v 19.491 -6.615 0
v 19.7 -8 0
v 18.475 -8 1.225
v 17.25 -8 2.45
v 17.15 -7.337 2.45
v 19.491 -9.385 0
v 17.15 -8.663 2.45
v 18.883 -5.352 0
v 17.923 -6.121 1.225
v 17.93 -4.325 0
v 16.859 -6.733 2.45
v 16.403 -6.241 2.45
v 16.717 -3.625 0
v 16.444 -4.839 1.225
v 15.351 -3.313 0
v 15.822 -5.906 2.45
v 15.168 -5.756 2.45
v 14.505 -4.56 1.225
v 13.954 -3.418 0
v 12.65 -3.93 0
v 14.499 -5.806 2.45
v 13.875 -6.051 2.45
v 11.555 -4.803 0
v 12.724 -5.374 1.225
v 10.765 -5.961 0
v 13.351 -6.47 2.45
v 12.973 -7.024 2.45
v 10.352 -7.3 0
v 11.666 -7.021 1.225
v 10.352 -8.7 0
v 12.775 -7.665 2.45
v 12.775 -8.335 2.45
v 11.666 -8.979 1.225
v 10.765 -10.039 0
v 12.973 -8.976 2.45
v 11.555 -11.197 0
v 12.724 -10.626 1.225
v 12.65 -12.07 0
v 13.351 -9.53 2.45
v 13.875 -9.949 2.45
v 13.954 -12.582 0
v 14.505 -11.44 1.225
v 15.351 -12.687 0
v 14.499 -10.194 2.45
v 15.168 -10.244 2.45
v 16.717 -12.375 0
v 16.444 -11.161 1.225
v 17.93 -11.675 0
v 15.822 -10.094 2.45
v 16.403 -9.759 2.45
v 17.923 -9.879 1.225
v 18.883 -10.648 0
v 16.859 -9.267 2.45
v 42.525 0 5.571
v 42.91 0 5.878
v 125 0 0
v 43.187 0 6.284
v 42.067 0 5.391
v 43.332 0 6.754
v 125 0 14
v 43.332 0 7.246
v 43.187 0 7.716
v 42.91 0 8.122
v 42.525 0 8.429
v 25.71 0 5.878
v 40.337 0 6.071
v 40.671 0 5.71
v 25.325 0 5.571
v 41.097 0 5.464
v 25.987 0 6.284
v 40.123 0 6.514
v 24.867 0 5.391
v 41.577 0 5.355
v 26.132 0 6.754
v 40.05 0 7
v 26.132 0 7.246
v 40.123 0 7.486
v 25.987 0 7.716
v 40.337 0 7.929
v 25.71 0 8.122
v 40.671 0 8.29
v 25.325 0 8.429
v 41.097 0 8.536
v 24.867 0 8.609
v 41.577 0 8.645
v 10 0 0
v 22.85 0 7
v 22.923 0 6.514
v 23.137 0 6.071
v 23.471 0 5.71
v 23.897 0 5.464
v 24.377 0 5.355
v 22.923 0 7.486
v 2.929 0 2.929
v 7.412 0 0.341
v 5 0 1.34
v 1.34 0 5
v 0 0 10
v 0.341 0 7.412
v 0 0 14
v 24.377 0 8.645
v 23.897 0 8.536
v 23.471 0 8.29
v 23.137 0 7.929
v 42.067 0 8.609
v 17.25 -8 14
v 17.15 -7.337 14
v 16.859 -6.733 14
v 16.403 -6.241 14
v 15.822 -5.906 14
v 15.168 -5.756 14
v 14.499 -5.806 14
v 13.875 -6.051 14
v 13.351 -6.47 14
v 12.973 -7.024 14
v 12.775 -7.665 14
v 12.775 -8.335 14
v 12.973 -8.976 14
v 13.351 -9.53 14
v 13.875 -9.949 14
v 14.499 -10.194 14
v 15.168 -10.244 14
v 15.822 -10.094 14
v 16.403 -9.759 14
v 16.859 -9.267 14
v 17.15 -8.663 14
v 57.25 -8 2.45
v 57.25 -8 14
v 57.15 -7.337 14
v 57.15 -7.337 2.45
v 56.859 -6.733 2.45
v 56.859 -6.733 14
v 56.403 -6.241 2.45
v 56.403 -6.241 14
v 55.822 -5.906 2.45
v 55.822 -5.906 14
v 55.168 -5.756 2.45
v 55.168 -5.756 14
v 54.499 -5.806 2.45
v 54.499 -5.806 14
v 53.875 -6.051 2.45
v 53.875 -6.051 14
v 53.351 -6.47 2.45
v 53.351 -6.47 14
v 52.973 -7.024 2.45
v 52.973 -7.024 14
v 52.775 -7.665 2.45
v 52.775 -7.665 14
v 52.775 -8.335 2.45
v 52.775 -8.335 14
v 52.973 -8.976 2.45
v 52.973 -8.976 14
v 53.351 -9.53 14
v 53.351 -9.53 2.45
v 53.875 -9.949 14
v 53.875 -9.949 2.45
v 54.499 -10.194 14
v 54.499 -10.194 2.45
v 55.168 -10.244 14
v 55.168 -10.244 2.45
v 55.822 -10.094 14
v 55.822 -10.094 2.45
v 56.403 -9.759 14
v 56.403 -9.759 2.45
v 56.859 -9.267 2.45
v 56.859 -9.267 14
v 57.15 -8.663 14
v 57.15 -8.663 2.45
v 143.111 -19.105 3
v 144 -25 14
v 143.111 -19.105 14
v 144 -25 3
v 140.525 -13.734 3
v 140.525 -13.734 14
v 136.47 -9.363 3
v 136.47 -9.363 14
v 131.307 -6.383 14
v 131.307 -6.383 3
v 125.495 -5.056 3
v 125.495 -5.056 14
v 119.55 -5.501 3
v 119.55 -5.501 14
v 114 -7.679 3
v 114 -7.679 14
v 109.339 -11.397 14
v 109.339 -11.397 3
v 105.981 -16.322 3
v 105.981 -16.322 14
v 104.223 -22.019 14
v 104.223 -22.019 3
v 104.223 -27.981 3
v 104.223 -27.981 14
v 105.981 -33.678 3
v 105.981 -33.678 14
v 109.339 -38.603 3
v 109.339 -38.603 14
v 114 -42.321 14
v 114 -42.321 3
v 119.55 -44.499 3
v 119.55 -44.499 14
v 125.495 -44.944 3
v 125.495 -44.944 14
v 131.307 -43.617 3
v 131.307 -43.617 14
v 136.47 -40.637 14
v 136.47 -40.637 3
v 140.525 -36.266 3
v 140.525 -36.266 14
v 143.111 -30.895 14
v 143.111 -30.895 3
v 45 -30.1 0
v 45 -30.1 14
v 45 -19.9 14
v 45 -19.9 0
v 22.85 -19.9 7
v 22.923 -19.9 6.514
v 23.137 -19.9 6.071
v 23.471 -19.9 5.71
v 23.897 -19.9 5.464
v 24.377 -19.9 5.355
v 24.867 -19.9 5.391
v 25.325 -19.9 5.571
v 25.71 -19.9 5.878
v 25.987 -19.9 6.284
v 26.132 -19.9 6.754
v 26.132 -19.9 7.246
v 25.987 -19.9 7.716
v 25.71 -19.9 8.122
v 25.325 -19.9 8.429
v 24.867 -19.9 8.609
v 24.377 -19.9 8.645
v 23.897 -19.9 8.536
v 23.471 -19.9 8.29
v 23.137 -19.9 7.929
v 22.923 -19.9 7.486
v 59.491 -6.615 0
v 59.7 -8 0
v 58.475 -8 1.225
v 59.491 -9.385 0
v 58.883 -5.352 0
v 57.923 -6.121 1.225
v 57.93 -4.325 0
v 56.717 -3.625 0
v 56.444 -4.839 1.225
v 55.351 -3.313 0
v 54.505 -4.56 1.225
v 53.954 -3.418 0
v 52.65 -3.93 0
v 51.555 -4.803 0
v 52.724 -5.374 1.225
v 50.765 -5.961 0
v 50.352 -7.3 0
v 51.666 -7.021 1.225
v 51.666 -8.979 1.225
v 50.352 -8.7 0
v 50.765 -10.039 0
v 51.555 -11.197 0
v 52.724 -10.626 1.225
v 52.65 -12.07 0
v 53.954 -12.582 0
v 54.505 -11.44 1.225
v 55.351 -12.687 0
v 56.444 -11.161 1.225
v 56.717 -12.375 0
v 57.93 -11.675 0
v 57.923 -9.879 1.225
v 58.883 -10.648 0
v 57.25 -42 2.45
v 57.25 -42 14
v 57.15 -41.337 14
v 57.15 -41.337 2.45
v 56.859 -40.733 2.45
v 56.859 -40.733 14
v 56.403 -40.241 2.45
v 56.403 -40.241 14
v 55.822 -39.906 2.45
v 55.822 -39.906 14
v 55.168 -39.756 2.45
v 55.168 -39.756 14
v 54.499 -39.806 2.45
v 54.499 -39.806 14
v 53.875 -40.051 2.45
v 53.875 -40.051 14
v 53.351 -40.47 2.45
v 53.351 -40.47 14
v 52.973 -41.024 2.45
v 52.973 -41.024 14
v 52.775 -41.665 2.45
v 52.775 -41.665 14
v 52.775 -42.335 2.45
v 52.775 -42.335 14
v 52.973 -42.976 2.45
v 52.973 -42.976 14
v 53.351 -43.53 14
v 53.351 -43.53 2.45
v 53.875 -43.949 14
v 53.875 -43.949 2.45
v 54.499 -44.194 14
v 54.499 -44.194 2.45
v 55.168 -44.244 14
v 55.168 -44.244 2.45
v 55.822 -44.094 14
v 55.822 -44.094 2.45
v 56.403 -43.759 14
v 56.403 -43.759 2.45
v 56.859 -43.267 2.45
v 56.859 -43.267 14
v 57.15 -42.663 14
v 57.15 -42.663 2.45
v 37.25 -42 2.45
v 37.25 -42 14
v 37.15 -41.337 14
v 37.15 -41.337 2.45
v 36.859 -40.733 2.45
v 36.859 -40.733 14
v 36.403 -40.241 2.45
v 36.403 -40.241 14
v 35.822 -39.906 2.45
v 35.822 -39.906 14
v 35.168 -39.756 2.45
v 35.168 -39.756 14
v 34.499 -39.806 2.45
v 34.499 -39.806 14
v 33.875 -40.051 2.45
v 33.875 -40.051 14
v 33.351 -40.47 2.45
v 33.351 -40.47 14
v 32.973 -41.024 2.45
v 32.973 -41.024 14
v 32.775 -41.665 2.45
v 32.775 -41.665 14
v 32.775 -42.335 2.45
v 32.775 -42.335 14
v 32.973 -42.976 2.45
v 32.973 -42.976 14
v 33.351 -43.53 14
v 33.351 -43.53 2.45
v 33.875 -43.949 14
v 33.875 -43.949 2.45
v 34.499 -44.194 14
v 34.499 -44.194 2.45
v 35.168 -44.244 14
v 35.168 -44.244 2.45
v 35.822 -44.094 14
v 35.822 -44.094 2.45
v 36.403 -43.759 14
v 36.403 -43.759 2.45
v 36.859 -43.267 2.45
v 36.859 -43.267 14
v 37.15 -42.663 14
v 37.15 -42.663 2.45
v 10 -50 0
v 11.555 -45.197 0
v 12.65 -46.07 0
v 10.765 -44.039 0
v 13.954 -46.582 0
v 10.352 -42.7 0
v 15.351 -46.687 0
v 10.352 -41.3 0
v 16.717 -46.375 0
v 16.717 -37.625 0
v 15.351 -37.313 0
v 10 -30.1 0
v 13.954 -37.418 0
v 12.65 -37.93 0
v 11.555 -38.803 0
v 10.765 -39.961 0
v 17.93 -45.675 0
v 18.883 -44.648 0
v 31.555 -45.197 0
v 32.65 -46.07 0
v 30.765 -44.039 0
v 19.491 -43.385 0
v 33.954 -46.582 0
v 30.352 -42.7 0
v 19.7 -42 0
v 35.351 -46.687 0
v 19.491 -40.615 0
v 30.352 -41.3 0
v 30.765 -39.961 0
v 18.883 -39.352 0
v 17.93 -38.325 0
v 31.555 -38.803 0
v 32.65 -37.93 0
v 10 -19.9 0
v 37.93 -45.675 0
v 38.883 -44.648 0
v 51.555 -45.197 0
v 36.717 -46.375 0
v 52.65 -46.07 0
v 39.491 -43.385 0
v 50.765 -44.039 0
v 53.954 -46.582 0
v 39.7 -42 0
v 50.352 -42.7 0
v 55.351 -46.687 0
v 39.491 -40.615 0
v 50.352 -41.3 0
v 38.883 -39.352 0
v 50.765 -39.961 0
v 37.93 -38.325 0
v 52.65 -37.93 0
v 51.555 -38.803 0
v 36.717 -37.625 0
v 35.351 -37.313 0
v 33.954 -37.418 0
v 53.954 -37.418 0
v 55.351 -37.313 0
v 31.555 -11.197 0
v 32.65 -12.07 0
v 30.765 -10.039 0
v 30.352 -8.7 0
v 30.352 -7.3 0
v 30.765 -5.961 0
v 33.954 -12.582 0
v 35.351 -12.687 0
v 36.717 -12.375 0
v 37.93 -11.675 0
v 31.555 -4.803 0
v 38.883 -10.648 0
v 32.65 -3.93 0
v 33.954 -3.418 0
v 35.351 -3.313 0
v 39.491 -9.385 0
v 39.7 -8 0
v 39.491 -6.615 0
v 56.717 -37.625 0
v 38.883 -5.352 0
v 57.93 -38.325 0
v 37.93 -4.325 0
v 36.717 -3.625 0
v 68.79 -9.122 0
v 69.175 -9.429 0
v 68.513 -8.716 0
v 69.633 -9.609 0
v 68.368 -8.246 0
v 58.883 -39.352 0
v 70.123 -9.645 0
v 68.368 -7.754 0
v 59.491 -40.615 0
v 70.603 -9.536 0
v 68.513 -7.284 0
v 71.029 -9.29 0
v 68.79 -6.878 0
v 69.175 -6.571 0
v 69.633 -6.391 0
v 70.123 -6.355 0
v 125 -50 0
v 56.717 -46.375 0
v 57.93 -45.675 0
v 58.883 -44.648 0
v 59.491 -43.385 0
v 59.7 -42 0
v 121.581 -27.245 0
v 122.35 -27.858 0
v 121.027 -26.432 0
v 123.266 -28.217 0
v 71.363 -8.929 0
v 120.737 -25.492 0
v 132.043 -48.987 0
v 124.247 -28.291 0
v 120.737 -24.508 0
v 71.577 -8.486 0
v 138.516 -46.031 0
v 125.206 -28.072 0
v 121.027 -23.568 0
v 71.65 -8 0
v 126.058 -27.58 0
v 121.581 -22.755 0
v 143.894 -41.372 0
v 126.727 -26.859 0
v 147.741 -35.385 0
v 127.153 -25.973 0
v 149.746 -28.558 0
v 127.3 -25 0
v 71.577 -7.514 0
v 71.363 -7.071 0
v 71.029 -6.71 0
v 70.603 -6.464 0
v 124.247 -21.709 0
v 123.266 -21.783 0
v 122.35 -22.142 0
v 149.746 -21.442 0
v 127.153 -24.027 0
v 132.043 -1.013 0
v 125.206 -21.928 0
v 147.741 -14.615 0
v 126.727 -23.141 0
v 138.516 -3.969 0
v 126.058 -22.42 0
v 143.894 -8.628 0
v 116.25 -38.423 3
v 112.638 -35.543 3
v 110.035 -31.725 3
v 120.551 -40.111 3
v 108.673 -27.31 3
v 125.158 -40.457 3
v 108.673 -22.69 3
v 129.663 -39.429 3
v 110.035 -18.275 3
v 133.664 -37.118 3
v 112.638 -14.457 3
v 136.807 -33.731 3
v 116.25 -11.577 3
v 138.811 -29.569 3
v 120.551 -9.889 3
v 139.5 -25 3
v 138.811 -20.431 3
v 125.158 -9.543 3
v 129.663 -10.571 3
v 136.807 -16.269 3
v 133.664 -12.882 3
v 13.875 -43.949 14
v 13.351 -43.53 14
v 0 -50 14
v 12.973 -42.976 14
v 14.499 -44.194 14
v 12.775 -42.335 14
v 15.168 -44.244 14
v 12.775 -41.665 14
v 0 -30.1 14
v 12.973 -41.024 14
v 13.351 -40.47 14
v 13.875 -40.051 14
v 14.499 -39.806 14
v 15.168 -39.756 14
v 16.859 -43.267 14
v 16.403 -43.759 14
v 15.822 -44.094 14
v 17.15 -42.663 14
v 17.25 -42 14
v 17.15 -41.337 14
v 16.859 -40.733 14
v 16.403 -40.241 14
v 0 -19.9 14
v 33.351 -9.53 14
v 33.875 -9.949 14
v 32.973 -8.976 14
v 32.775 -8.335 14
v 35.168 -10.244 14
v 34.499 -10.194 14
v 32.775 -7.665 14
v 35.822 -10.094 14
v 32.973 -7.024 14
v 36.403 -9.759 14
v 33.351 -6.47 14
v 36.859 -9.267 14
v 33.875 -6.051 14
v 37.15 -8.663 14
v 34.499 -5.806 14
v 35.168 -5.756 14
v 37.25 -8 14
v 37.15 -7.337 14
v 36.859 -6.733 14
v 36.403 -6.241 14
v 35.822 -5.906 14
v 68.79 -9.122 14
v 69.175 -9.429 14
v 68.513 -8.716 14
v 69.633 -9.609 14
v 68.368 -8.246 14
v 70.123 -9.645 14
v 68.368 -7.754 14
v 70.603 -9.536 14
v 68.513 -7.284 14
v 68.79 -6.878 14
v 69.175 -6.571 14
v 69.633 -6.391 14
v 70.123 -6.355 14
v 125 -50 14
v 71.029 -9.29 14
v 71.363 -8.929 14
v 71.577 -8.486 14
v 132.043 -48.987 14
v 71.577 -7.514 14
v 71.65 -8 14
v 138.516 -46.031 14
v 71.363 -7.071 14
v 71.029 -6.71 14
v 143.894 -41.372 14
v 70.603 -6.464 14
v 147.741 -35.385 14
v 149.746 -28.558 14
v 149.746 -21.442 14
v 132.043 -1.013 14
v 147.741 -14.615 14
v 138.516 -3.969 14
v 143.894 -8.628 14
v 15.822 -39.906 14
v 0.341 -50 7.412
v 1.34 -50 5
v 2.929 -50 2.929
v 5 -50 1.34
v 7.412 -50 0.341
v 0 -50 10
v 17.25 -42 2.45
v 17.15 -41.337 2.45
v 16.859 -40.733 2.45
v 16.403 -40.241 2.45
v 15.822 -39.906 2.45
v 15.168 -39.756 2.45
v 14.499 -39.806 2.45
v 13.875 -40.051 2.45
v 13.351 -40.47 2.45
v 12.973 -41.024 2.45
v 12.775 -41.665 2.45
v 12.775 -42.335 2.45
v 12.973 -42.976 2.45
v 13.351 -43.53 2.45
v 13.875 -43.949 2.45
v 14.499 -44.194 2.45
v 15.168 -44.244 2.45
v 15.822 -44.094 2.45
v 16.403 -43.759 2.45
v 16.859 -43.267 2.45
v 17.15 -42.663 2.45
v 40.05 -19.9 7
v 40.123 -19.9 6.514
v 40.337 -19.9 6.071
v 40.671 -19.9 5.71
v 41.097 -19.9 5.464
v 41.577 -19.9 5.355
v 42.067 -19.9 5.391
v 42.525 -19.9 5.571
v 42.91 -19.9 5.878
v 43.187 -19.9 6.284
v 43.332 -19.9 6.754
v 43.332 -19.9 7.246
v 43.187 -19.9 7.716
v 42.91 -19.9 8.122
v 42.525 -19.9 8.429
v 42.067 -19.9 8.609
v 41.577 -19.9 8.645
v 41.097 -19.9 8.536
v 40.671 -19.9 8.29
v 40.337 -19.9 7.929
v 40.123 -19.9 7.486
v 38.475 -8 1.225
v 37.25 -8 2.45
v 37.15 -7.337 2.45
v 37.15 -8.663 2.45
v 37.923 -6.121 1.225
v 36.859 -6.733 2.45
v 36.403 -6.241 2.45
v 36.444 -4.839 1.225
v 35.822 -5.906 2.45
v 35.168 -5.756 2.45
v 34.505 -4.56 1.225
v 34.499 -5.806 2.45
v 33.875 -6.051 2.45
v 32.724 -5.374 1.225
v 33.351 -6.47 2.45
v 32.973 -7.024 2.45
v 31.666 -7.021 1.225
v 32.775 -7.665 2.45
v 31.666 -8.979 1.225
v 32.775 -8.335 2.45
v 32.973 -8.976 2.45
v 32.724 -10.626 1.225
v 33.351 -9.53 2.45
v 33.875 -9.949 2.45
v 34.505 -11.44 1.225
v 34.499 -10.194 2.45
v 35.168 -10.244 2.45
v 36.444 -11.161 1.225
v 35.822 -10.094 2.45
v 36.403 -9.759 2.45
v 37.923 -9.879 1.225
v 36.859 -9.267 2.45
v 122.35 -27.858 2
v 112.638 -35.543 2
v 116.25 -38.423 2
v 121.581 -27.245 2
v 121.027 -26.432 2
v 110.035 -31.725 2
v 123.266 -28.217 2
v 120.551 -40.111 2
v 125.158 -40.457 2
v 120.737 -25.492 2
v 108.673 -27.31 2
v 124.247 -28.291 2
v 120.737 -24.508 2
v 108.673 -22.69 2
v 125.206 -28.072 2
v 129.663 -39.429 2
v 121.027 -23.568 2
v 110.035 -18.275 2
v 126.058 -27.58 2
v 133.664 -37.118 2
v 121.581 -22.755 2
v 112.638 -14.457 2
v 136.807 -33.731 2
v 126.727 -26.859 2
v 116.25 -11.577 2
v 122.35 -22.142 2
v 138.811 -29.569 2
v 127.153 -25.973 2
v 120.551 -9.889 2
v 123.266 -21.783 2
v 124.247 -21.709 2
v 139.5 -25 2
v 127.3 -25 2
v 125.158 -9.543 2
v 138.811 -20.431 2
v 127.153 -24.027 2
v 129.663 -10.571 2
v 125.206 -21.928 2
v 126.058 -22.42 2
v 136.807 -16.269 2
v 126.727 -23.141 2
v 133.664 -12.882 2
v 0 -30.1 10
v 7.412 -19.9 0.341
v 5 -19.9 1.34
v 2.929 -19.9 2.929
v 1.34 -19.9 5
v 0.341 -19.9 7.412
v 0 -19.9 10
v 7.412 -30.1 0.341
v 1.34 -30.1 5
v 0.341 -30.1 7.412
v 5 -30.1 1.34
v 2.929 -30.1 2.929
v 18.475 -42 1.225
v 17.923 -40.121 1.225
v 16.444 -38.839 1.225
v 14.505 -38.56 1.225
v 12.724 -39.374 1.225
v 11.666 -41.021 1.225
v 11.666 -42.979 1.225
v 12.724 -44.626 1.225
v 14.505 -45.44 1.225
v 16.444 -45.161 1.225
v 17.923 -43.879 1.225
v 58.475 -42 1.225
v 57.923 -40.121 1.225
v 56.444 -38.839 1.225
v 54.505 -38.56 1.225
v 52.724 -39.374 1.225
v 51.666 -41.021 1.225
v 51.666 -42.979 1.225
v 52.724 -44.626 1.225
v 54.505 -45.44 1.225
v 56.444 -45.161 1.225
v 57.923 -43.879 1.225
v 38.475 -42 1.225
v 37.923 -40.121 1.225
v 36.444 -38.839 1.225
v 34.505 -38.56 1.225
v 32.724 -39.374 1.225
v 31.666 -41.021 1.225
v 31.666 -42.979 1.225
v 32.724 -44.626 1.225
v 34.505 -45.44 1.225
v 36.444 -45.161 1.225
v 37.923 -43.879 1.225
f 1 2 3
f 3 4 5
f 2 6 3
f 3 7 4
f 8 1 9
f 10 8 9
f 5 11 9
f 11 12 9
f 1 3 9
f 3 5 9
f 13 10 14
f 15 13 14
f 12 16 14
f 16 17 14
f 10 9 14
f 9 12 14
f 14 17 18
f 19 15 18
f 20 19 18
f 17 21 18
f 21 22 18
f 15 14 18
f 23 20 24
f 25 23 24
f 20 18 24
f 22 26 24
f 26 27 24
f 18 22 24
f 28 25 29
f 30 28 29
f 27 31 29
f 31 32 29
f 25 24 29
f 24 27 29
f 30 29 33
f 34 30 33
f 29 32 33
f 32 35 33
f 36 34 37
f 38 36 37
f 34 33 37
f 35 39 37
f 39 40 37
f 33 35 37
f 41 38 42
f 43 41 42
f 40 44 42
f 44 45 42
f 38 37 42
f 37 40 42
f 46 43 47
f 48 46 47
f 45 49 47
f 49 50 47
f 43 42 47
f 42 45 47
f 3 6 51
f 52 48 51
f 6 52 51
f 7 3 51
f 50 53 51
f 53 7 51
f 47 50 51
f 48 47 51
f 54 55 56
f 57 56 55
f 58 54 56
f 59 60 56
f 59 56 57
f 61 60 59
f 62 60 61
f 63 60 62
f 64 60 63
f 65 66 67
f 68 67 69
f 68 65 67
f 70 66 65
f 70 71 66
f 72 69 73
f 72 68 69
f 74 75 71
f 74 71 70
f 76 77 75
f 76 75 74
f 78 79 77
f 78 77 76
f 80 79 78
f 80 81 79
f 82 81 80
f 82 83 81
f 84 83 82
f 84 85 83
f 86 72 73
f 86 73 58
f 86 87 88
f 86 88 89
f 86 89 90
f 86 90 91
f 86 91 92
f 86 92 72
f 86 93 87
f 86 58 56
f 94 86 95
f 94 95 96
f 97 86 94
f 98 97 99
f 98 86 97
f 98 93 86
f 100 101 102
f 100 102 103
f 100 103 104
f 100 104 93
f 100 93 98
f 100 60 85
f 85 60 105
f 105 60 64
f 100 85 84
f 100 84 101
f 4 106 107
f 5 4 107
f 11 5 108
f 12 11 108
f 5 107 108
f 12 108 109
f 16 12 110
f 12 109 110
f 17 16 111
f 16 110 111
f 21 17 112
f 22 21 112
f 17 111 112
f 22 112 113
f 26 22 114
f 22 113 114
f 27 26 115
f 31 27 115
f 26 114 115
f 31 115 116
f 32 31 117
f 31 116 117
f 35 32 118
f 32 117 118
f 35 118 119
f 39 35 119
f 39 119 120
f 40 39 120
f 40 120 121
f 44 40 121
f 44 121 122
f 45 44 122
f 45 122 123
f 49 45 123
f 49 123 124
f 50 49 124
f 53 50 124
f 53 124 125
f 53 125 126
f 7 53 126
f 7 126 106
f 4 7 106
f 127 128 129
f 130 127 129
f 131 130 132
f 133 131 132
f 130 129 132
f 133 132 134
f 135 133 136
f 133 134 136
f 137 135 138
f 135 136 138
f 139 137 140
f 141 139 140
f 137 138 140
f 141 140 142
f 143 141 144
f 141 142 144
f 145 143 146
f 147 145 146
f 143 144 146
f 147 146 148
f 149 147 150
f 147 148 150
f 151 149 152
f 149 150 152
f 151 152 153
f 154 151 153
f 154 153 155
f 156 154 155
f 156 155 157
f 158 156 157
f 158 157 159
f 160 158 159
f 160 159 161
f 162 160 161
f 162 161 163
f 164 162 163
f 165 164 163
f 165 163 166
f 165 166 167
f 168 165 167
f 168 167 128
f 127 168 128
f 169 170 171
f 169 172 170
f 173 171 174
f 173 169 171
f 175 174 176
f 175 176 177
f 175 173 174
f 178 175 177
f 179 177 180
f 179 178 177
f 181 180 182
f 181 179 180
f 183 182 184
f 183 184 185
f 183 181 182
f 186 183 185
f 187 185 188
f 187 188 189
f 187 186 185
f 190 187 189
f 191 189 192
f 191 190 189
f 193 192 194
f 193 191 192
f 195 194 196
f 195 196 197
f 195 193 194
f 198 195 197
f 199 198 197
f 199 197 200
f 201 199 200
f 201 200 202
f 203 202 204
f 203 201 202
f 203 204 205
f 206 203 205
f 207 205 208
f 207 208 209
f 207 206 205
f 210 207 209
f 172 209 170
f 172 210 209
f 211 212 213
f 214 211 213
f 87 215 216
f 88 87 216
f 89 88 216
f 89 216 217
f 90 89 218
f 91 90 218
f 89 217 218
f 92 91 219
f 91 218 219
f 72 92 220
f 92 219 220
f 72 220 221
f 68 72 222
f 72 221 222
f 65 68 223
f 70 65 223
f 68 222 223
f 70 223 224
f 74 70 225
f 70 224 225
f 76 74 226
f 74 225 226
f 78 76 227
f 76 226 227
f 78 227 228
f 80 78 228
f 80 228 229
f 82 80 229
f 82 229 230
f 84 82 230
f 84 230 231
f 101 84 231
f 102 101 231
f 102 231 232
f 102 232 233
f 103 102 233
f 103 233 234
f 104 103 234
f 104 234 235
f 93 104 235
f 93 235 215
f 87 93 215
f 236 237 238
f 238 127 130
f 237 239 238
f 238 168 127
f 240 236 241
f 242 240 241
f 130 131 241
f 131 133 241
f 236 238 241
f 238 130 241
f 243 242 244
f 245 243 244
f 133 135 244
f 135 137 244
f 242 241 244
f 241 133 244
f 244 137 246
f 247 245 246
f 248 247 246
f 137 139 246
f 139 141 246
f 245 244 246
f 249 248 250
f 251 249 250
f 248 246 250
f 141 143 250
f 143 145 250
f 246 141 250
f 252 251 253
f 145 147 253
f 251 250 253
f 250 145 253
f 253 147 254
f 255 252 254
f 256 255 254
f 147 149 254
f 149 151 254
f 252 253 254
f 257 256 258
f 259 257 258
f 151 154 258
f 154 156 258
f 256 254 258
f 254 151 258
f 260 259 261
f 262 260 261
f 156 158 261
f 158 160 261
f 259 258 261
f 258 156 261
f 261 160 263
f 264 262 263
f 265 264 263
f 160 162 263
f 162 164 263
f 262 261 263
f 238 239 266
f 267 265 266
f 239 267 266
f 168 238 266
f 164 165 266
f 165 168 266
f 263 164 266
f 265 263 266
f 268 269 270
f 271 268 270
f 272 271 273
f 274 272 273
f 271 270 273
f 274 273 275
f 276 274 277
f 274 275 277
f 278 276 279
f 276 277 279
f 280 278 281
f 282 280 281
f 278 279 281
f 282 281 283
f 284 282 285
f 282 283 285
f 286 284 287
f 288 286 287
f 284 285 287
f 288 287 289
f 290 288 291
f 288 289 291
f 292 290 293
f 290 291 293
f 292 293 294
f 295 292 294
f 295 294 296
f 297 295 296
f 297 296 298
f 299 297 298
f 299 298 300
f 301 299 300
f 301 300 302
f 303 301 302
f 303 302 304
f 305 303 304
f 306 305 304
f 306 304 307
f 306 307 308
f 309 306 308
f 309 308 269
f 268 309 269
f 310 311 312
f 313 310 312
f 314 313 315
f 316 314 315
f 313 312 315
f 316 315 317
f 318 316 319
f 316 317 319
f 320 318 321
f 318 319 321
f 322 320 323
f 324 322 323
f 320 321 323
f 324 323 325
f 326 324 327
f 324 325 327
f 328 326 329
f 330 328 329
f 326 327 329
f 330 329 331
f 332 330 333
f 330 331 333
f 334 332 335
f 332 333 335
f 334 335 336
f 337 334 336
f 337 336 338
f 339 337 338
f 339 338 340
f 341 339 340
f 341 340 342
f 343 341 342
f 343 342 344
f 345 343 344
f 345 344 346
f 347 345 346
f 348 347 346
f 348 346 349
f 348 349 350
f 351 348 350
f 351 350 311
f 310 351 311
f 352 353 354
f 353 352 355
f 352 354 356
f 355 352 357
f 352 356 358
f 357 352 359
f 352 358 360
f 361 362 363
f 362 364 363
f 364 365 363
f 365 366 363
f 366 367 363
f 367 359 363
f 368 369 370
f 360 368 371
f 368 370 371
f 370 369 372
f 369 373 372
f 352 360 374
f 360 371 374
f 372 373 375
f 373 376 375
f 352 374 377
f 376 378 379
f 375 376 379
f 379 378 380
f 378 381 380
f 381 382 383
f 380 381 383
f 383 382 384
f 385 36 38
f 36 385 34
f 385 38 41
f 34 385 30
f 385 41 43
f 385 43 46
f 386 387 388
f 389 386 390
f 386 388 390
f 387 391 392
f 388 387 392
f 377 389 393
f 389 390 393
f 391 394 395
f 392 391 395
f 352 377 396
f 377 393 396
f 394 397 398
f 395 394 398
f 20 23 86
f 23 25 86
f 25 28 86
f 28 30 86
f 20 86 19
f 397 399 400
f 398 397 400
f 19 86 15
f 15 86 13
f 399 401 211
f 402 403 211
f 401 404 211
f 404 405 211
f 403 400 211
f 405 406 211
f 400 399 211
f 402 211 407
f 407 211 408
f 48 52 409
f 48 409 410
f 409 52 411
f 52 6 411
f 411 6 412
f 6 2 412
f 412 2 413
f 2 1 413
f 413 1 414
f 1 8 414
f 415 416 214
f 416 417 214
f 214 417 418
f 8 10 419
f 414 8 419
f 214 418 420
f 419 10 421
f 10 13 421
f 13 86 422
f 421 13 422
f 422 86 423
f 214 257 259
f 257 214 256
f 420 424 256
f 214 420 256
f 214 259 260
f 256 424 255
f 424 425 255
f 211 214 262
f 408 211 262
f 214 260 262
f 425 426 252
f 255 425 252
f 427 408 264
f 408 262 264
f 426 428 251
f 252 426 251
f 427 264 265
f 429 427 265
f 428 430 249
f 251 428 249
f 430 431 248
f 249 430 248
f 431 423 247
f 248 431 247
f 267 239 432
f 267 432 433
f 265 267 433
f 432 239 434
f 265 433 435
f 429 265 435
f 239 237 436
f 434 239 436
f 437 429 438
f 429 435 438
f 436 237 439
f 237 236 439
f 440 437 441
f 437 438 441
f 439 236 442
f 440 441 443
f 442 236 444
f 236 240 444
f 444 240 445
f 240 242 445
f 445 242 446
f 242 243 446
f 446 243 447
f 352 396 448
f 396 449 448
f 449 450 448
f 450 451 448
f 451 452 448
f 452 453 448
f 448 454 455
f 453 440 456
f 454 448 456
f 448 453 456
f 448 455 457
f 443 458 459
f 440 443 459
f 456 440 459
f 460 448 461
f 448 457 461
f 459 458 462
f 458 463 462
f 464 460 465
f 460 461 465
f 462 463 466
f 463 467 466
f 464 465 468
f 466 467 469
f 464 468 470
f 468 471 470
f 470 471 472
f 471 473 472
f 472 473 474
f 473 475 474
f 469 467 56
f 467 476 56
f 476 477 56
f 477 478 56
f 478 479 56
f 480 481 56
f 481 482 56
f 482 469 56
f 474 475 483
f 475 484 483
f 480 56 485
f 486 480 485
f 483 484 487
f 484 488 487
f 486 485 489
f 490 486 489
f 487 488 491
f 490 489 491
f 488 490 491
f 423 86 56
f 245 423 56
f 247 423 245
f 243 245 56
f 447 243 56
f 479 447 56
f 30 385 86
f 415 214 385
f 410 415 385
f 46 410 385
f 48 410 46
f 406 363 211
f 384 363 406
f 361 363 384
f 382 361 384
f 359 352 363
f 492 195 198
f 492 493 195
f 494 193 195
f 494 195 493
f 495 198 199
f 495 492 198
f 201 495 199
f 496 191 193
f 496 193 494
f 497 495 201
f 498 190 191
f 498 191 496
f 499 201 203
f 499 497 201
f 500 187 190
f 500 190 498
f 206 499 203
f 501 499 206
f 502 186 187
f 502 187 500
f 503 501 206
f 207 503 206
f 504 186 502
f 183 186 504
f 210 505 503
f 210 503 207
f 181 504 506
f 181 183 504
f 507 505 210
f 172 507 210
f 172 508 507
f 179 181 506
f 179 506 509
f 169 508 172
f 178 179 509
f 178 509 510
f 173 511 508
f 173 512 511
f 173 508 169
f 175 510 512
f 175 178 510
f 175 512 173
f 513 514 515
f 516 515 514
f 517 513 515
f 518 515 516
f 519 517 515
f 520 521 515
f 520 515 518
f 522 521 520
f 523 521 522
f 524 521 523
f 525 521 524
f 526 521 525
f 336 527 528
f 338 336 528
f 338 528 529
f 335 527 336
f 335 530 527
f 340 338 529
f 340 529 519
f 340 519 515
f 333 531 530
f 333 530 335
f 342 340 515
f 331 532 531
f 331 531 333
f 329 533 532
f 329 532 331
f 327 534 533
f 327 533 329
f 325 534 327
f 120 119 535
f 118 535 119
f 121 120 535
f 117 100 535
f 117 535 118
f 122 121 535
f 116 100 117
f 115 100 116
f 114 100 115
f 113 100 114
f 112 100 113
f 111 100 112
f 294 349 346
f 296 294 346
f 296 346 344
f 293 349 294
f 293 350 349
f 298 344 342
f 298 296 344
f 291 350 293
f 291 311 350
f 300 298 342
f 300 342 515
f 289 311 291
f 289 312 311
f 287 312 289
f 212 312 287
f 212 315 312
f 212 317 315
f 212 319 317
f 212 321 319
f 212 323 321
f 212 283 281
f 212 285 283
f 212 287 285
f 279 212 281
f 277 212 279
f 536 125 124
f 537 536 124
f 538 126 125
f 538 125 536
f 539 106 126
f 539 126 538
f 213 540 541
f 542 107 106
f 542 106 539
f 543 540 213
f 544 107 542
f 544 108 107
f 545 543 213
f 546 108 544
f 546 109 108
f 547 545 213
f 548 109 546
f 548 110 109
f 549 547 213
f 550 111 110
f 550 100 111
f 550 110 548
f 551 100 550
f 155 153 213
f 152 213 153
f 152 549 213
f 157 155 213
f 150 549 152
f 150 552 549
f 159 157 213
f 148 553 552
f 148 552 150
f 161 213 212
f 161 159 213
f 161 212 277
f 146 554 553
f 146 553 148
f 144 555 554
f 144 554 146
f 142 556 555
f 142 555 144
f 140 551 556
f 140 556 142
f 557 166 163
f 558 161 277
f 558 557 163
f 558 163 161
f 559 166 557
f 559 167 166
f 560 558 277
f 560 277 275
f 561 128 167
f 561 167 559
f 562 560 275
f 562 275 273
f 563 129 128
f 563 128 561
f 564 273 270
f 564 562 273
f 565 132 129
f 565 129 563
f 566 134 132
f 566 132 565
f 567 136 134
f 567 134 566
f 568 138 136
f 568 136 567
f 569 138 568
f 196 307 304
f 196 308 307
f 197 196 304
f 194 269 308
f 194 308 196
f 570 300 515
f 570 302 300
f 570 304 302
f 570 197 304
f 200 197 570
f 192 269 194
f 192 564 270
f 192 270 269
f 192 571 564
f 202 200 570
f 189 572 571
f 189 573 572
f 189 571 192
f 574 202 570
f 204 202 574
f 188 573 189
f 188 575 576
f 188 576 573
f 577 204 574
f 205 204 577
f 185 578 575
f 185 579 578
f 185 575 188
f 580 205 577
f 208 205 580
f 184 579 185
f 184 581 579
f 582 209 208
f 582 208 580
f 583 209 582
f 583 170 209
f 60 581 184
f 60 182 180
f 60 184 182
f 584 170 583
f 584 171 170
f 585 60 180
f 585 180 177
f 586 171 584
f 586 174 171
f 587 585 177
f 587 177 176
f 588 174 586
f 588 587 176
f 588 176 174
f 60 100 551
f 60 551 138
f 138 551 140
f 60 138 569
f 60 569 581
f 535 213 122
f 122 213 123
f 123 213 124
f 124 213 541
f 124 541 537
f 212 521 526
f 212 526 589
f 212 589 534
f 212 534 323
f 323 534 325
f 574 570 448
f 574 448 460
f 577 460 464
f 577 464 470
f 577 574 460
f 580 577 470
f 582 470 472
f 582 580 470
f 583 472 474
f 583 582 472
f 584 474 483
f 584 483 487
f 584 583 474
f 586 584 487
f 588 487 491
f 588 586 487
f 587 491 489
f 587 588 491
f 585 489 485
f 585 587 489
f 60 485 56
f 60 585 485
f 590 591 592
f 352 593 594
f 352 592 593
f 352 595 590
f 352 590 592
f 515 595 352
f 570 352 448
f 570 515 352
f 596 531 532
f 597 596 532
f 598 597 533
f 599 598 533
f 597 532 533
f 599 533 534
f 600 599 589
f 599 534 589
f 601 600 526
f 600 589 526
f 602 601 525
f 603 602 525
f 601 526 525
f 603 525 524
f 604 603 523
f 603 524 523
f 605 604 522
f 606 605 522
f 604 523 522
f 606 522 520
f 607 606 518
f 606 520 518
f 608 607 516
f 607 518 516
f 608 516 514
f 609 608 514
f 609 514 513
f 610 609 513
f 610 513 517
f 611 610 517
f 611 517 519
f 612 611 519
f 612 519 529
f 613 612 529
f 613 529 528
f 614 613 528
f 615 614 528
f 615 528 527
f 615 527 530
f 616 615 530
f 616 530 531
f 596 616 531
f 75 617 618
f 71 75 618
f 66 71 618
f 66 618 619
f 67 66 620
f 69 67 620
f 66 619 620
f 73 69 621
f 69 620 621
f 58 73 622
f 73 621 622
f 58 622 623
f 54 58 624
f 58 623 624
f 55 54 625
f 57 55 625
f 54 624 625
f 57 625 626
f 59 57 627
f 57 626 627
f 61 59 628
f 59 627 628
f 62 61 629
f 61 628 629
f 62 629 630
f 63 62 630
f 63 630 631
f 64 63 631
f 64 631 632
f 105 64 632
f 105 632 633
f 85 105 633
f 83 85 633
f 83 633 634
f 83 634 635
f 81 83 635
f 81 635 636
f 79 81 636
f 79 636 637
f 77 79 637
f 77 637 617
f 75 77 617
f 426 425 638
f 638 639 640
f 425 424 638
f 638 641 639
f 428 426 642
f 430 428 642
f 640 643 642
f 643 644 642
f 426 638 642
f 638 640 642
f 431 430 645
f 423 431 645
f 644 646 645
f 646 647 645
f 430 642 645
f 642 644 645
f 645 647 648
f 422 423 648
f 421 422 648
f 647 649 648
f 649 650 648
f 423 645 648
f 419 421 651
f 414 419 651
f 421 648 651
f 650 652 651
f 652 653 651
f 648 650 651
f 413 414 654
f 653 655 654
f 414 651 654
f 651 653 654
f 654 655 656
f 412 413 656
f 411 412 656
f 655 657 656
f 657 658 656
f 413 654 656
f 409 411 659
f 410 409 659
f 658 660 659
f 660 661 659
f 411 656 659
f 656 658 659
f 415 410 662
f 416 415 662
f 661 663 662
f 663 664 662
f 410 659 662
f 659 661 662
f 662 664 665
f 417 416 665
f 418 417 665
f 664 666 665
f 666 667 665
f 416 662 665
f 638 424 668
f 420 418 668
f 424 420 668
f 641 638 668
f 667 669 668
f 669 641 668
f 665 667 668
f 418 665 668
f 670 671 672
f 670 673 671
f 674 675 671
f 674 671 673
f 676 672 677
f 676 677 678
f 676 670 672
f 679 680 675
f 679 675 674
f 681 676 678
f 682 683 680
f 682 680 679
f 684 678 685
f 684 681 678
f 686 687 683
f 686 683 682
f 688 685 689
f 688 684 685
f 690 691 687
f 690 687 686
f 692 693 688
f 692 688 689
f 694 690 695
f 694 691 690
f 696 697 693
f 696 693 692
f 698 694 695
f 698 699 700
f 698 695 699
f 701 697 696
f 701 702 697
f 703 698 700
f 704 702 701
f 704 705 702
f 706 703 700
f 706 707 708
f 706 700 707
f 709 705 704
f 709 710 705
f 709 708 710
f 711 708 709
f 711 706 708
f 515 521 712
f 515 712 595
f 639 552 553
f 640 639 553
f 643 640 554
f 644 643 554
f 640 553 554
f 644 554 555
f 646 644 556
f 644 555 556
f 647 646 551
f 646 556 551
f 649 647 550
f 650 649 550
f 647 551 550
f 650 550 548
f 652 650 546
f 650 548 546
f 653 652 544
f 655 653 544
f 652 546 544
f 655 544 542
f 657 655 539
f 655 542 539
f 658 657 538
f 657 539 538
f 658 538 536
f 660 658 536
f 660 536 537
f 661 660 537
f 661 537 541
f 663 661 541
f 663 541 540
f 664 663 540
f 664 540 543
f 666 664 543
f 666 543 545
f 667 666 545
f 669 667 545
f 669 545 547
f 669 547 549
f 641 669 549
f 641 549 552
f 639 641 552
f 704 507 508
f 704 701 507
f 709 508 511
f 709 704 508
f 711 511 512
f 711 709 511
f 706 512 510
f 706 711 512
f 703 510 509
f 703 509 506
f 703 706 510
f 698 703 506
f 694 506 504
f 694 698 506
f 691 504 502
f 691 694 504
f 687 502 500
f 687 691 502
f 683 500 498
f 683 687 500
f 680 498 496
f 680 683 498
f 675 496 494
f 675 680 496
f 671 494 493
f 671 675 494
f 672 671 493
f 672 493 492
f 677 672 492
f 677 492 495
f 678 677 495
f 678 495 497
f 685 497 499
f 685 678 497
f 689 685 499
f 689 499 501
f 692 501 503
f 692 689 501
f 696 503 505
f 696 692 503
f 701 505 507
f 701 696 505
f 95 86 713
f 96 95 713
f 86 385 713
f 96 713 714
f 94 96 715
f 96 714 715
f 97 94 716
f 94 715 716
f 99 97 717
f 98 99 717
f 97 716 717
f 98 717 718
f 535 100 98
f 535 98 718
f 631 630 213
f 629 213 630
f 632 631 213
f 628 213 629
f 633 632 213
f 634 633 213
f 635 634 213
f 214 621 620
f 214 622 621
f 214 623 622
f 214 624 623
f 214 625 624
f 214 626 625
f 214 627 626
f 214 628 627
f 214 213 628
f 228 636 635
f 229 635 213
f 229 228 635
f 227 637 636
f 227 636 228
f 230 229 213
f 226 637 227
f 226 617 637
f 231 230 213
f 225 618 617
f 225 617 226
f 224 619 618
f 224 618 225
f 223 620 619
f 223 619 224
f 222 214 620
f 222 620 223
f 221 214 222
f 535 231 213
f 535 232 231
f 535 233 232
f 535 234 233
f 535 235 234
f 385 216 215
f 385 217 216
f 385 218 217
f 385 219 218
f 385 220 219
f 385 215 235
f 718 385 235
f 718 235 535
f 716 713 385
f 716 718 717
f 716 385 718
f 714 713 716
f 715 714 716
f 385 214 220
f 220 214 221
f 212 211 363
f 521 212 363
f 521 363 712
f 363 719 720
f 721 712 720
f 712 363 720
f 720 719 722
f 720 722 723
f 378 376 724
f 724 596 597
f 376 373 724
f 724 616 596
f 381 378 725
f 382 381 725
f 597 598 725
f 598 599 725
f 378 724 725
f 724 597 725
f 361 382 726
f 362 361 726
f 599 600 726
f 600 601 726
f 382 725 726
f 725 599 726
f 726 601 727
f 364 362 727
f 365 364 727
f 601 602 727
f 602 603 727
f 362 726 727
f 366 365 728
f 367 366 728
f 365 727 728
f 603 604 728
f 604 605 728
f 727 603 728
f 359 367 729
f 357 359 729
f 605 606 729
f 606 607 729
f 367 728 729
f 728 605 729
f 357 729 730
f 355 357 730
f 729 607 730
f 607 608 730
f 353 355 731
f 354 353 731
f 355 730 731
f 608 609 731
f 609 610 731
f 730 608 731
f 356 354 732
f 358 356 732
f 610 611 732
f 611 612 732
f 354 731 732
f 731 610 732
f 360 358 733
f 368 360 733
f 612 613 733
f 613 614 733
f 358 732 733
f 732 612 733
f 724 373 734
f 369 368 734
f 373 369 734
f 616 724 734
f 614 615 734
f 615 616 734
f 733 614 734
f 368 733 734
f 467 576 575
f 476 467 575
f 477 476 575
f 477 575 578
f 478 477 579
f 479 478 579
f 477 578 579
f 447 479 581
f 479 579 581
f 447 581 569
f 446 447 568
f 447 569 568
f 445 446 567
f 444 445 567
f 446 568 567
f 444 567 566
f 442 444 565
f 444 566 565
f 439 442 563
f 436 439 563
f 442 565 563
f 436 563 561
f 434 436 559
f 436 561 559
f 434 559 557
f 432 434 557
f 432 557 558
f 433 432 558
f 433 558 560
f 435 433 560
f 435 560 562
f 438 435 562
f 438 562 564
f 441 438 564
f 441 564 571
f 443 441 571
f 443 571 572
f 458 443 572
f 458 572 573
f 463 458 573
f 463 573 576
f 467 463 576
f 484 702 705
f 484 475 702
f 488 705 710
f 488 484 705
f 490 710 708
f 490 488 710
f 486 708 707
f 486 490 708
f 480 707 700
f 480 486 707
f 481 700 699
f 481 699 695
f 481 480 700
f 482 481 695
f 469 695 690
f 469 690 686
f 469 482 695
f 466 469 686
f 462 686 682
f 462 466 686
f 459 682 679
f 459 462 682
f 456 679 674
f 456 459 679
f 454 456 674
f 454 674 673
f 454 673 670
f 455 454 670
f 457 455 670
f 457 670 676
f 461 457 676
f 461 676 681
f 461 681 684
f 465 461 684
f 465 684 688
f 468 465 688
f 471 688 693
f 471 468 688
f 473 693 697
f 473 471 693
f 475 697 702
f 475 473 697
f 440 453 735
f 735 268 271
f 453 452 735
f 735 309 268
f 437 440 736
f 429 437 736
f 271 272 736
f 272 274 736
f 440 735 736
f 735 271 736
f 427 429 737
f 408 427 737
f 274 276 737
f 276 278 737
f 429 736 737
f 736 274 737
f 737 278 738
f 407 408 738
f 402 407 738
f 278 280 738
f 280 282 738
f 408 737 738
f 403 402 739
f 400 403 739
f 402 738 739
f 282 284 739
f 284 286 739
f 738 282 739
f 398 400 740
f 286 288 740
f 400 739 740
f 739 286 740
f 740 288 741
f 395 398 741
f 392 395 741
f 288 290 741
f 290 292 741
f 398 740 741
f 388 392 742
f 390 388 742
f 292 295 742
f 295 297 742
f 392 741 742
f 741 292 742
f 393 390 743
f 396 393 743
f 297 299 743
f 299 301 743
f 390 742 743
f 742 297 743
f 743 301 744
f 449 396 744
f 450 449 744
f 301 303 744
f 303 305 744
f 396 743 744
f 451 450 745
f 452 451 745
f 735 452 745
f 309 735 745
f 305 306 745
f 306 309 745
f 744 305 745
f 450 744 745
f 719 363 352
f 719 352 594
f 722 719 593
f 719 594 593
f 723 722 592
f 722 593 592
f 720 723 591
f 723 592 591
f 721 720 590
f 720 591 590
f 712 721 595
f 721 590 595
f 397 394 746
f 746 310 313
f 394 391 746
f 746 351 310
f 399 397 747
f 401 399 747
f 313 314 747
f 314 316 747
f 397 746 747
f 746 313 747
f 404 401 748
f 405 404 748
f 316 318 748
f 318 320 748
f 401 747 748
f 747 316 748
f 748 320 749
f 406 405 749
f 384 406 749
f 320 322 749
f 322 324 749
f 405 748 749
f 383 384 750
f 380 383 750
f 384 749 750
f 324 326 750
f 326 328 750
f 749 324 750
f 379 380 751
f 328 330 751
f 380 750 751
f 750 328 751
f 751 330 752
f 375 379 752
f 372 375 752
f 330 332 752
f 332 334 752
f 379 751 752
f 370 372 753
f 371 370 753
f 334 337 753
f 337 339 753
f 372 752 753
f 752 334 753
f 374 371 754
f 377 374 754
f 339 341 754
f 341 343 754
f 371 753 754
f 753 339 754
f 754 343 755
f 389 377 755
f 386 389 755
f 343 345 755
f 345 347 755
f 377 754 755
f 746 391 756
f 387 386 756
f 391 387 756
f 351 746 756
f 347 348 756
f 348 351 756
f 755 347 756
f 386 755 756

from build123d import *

# Parameters (mm, degrees)
BOSS_EXTRUDE1_DEPTH       = 14
SKETCH2_W                 = 45
SKETCH2_H                 = 10.2
CUT_EXTRUDE1_DEPTH        = 15
F_4_CLEARANCE_HOLE1_D     = 3.3
F_4_CLEARANCE_HOLE1_DEPTH = 14
F_4_CLEARANCE_HOLE2_D     = 3.3
F_4_CLEARANCE_HOLE2_DEPTH = 19.899999999
F_8_CLEARANCE_HOLE1_D     = 4.5
F_8_CLEARANCE_HOLE1_DEPTH = 14
CHAMFER1_SIZE             = 2.45
FILLET1_R                 = 10


with BuildPart() as part:
    # Sketch1 → Boss-Extrude1 (new body)
    with BuildSketch(Plane.XY.offset(14)):
        with BuildLine():
            Line((125, 0), (0, 0))
            Line((0, 0), (0, -50))
            Line((0, -50), (125, -50))
            ThreePointArc((125, -50), (150, -25), (125, 0))
        make_face()
    extrude(amount=-BOSS_EXTRUDE1_DEPTH)

    # Sketch2 → Cut-Extrude1 (cut, through all)
    with BuildSketch(Plane(origin=(0, 0, 0), x_dir=(-1, 0, 0), z_dir=(0, 0, -1))):
        with Locations((-22.5, -24.999999999)):
            Rectangle(SKETCH2_W, SKETCH2_H)
    extrude(amount=-CUT_EXTRUDE1_DEPTH, mode=Mode.SUBTRACT)

    # Sketch3 → Cut-Revolve1 (revolve, cut)
    with BuildSketch(Plane(origin=(0, -24.999999999, 0), x_dir=(1, 0, 0), z_dir=(0, 1, 0))):
        Polygon((127.3, 0), (123.999999995, 0), (123.999999995, -14), (144, -14), (144, -3), (139.5, -3), (139.5, -2), (127.3, -2), align=None)
    revolve(axis=Axis((123.999999995, -24.999999999, 0), (0, 0, 1)), mode=Mode.SUBTRACT)

    # #4 Clearance Hole1
    with Locations(Plane(origin=(0, 0, 0), x_dir=(-1, 0, 0), z_dir=(0, 0, -1))):
        with Locations((-70, -8)):
            Hole(F_4_CLEARANCE_HOLE1_D / 2, depth=F_4_CLEARANCE_HOLE1_DEPTH)

    # #4 Clearance Hole2
    with Locations(Plane(origin=(0, 0, 0), x_dir=(1, 0, 0), z_dir=(0, 1, 0))):
        with Locations((24.5, -7), (41.7, -7)):
            Hole(F_4_CLEARANCE_HOLE2_D / 2, depth=F_4_CLEARANCE_HOLE2_DEPTH)

    # #8 Clearance Hole1
    with Locations(Plane(origin=(0, 0, 0), x_dir=(-1, 0, 0), z_dir=(0, 0, -1))):
        with Locations((-15, -8), (-15, -42), (-35, -42), (-35, -8), (-55, -8), (-55, -42)):
            Hole(F_8_CLEARANCE_HOLE1_D / 2, depth=F_8_CLEARANCE_HOLE1_DEPTH)

    # Chamfer1
    chamfer1_edges = [part.edges().sort_by_distance(p)[0] for p in [
        (52.75, -42, 0),
        (52.75, -8, 0),
        (32.75, -8, 0),
        (32.75, -42, 0),
        (12.75, -42, 0),
        (12.75, -8, 0),
    ]]
    chamfer(chamfer1_edges, length=CHAMFER1_SIZE)

    # Fillet1
    fillet1_edges = [part.edges().sort_by_distance(p)[0] for p in [
        (0, -9.95, 0),
        (0, -40.05, 0),
    ]]
    fillet(fillet1_edges, radius=FILLET1_R)


solid = part.part
